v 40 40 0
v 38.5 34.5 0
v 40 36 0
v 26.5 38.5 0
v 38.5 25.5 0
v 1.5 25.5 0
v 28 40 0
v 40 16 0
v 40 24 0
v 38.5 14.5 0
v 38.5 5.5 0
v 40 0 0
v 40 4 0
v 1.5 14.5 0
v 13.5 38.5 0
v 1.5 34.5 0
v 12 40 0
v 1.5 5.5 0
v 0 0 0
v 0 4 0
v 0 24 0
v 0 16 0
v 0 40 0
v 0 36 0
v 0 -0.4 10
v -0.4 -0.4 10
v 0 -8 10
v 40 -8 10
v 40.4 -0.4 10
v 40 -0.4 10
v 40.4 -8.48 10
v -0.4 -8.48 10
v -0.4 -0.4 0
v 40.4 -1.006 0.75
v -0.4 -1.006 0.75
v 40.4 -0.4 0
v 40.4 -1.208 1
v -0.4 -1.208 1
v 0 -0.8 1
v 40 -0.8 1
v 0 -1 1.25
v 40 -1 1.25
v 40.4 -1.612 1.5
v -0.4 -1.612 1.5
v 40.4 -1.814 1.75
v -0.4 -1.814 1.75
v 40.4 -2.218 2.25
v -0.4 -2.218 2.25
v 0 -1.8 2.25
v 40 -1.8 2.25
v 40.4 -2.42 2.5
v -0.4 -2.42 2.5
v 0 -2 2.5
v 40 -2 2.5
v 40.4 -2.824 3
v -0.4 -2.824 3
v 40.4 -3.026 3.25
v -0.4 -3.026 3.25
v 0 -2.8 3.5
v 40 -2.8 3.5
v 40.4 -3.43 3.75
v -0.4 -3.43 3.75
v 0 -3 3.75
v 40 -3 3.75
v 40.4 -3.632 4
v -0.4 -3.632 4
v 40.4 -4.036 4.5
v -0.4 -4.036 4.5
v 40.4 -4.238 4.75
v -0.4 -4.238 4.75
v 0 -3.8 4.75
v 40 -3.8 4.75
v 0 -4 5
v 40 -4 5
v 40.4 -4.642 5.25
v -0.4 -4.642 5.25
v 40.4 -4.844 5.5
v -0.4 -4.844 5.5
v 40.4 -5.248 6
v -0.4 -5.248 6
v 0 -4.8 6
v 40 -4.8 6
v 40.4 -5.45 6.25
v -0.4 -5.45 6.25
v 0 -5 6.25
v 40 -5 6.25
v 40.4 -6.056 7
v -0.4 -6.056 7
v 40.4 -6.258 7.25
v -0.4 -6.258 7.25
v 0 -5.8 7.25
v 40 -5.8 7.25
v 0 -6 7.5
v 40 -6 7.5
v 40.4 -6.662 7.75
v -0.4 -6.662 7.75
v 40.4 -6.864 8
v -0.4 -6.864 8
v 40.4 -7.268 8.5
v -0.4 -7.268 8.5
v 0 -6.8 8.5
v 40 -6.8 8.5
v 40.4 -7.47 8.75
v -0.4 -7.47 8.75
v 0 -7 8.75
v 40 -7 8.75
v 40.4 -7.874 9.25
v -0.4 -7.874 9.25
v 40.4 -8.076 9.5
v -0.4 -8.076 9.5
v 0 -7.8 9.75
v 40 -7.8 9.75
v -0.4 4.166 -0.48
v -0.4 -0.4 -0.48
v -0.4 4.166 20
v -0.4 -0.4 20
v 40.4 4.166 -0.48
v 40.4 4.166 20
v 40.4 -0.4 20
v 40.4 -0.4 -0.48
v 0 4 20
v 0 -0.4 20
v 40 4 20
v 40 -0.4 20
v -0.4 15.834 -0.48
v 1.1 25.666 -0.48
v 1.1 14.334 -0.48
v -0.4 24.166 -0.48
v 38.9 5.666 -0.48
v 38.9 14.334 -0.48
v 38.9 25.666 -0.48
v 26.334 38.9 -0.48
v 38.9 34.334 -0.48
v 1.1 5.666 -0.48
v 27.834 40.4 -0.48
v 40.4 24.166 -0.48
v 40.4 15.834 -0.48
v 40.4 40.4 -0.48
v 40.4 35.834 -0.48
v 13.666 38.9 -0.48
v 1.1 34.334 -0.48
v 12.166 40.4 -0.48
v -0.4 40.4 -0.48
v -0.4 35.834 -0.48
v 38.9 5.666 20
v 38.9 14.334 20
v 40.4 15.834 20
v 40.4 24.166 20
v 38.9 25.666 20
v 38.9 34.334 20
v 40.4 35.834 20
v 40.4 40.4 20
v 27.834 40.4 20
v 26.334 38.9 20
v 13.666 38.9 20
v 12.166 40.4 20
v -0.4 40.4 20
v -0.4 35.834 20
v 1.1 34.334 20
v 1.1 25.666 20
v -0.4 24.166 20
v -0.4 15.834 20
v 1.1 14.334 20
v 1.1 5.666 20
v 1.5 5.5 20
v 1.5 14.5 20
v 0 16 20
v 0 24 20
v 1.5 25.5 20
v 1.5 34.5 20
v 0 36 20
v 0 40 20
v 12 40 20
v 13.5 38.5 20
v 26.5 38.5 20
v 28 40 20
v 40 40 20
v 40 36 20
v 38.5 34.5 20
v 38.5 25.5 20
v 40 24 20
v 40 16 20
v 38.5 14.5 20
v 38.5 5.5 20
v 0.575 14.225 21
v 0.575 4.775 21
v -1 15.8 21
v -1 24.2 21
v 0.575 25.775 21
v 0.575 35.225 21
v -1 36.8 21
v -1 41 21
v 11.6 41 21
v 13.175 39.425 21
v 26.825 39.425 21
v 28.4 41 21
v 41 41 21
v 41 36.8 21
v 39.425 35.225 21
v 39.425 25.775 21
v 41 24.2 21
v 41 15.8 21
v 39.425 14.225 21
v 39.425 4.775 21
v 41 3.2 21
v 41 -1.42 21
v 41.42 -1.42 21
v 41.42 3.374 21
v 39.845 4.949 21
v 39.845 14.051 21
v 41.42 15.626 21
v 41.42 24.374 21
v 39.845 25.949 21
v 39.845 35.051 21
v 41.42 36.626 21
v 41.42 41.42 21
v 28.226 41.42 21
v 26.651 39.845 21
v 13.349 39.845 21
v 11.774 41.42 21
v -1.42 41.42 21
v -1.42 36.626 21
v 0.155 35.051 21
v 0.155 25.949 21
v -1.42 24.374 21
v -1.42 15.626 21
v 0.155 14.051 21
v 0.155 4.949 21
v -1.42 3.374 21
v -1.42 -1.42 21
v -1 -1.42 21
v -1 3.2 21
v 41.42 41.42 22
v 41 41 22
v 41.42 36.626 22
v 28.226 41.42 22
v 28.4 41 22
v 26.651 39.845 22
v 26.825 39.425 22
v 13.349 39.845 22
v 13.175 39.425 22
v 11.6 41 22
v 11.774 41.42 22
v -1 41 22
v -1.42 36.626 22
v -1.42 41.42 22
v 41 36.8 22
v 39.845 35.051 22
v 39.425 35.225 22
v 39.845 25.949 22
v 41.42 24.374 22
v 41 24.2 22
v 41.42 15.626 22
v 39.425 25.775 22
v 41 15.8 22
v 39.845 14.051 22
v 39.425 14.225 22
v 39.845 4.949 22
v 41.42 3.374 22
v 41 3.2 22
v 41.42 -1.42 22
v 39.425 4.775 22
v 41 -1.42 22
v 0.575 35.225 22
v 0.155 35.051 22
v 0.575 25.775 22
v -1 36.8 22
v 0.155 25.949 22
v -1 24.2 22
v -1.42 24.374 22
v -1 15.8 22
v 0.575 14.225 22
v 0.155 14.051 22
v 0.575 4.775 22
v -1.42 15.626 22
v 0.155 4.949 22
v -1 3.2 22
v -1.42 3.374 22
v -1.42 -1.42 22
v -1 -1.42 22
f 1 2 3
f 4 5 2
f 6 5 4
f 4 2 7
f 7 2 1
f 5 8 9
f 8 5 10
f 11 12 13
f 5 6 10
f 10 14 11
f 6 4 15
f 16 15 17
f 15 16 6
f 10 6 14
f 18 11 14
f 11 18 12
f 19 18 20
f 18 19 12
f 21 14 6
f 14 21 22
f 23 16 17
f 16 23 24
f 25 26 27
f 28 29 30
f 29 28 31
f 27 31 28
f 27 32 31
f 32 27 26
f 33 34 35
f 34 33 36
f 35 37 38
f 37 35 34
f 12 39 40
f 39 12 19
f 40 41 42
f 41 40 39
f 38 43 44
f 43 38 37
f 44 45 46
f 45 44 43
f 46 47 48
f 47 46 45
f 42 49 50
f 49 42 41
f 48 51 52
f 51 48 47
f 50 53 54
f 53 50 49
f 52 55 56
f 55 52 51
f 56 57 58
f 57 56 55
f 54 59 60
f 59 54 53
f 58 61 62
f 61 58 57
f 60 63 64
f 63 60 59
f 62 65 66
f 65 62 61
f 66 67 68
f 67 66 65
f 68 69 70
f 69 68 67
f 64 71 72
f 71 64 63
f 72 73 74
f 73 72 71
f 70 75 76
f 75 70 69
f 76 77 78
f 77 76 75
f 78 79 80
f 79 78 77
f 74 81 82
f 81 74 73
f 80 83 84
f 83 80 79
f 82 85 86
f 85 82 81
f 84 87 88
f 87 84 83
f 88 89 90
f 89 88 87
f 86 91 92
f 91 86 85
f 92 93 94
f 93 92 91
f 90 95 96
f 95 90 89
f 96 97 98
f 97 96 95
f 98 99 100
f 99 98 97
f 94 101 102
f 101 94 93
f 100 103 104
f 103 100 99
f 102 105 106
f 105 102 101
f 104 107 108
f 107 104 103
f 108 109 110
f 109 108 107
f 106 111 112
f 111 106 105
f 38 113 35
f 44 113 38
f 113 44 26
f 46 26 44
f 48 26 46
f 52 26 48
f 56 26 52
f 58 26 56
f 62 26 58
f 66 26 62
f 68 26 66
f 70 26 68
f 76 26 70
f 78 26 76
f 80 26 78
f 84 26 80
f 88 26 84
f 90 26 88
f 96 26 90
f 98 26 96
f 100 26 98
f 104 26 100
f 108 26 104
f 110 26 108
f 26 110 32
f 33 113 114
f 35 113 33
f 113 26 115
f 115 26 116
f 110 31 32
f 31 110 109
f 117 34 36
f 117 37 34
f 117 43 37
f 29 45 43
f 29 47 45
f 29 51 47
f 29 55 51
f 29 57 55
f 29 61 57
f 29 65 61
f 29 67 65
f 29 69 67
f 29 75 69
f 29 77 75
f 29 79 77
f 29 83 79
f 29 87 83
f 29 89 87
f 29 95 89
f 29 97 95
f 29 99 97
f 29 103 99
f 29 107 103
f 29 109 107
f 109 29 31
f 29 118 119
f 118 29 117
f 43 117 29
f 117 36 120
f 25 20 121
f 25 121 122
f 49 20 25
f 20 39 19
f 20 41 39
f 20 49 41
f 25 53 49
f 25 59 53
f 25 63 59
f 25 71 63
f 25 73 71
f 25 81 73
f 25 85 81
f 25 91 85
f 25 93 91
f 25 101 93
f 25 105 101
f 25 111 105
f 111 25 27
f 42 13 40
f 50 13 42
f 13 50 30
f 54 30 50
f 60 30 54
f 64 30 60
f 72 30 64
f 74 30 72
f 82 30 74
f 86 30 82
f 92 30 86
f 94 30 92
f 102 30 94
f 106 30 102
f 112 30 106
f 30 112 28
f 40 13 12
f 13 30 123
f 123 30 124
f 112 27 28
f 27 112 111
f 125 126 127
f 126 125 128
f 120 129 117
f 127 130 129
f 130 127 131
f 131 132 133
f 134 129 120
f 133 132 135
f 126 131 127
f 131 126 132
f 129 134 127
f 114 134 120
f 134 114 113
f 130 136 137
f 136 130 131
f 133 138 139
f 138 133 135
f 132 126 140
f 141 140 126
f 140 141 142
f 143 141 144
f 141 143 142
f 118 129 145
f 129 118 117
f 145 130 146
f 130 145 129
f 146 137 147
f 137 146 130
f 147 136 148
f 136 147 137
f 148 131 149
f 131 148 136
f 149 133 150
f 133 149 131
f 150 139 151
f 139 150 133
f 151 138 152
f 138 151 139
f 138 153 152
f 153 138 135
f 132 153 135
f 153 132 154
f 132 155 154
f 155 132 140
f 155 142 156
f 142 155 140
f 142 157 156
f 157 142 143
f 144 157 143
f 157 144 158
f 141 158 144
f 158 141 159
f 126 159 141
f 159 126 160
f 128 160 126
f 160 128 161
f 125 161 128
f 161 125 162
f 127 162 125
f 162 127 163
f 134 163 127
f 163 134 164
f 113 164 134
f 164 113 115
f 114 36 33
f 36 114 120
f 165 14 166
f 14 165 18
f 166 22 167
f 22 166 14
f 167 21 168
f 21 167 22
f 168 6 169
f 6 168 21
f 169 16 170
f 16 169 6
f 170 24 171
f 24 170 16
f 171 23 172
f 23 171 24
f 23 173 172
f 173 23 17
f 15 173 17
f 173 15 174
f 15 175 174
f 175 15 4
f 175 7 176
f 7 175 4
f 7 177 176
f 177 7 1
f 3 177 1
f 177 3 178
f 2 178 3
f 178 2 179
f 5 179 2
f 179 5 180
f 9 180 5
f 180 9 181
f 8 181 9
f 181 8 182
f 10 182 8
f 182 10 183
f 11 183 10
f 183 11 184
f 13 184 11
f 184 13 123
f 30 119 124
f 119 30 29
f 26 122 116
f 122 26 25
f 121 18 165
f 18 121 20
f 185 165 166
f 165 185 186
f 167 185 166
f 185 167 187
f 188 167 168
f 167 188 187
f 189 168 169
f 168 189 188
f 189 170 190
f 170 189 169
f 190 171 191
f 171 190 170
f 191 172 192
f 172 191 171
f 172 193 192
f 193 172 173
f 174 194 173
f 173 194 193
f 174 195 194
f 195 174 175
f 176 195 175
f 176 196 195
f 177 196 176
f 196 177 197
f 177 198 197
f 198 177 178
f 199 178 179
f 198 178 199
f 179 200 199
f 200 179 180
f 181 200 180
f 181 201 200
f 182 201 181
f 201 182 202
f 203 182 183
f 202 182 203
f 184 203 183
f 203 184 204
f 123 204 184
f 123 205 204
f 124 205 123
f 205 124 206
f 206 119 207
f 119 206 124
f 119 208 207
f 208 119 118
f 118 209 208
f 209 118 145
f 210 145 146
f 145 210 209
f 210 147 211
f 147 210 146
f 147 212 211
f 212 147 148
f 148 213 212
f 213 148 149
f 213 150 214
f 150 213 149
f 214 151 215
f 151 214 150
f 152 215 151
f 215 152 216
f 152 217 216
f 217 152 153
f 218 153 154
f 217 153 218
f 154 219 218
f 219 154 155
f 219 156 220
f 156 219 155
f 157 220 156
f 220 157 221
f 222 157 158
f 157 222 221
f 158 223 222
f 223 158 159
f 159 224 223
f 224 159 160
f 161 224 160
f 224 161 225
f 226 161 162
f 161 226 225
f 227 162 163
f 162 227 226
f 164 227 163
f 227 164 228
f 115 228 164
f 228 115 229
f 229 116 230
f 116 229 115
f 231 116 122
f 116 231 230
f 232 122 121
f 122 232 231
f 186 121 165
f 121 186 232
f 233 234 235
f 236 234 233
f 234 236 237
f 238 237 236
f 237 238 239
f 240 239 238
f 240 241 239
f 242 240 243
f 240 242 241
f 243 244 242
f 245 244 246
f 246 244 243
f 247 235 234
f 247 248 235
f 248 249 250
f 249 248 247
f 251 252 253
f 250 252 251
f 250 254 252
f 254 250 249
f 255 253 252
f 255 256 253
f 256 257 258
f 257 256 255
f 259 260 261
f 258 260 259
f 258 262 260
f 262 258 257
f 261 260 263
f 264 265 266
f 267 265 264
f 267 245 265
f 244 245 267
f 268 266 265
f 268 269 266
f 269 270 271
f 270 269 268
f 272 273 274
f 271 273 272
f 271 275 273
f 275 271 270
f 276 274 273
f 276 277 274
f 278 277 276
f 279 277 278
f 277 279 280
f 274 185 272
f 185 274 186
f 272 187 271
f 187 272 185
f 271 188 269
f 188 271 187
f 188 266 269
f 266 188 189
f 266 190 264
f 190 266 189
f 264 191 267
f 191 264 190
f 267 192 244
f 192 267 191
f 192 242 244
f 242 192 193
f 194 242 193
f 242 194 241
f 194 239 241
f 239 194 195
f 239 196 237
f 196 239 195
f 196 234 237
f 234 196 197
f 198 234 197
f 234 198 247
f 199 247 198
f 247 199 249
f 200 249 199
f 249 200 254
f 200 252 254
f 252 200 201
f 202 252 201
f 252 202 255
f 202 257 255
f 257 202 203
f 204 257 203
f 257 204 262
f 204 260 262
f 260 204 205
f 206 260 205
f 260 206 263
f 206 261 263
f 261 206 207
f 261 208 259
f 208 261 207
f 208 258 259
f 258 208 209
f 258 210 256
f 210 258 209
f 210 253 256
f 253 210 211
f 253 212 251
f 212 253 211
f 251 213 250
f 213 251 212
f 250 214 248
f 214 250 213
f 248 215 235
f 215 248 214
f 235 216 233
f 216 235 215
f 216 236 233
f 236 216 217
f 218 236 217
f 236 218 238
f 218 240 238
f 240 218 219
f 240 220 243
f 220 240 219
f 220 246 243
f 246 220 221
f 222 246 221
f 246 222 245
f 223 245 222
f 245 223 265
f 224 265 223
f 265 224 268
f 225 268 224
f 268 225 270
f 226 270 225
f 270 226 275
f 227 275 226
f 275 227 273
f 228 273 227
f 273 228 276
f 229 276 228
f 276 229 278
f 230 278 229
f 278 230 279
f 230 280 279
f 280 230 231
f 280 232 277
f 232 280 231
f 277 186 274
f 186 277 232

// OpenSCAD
W = 40;
H = 30;
LT = 0.4;
LH = 0.16;
A = 1.5;

SHAPE = [
  [0, 0],
  [0, W * .1],
  [A, W * .1 + A],
  [A, W * .4 - A], 
  [0, W * .4],
  [0, W * .6],
  [A, W * .6 + A],
  [A, W * .9 - A], 
  [0, W * .9],
  [0, W],
  [W * .3, W],
  [W * .3 + A, W - A],
  [W * .7 - A, W - A],
  [W * .7, W],
  [W, W],
  [W, W * .9],
  [W - A, W * .9 - A],
  [W - A, W * .6 + A], 
  [W, W * .6],
  [W, W * .4],
  [W - A, W * .4 - A],
  [W - A, W * .1 + A], 
  [W, W * .1],
  [W, 0]
];

SHAPE2 = [
  [0, 0],
  [0, W],
  [W, W],
  [W, 0]
];

*difference() {
  cube([40, 40, 30], center = true);
  translate([0, 0, H * 2])
    cube([40 - 2 * T, 40 - 2 * T, 30], center = true);
}

translate([0, 0, LH * -3])
  linear_extrude(LH * 3)
    offset(delta = LT) 
      polygon(SHAPE);

difference() {
  translate([0, W, 0])
    linear_extrude(10, scale = [1, 1.2], slices = 40)
      translate([0, -W, 0]) 
        difference() {
          offset(delta = LT)
            polygon(SHAPE2);
          
          polygon(SHAPE2);
        }
  translate([-A * 2, 0, -2]) cube(50);
}

upper(10, 0, shiftY = W, shape = SHAPE);
upper(10, 10, shiftY = W);
upper(1, 20, shiftX = W / 2, shiftY = W / 2, scale = [1.05, 1.05]);
upper(1, 21, shiftX = W / 2, shiftY = W / 2, scale2 = [1.05, 1.05 * 1]);
      
module upper(h, last, scale = 1, shiftX = 0, shiftY = 0, scale2 = [1, 1], shape = SHAPE) {   
translate([shiftX, shiftY, last])
  linear_extrude(h, scale = scale)
    scale(scale2) 
      translate([-shiftX, -shiftY, 0]) 
        difference() {
          offset(delta = LT) 
            polygon(shape);

          polygon(shape);
          polygon([
            [0, -1],
            [0, 1],
            [W, 1],
            [W, -1]
          ]);
        }
}
